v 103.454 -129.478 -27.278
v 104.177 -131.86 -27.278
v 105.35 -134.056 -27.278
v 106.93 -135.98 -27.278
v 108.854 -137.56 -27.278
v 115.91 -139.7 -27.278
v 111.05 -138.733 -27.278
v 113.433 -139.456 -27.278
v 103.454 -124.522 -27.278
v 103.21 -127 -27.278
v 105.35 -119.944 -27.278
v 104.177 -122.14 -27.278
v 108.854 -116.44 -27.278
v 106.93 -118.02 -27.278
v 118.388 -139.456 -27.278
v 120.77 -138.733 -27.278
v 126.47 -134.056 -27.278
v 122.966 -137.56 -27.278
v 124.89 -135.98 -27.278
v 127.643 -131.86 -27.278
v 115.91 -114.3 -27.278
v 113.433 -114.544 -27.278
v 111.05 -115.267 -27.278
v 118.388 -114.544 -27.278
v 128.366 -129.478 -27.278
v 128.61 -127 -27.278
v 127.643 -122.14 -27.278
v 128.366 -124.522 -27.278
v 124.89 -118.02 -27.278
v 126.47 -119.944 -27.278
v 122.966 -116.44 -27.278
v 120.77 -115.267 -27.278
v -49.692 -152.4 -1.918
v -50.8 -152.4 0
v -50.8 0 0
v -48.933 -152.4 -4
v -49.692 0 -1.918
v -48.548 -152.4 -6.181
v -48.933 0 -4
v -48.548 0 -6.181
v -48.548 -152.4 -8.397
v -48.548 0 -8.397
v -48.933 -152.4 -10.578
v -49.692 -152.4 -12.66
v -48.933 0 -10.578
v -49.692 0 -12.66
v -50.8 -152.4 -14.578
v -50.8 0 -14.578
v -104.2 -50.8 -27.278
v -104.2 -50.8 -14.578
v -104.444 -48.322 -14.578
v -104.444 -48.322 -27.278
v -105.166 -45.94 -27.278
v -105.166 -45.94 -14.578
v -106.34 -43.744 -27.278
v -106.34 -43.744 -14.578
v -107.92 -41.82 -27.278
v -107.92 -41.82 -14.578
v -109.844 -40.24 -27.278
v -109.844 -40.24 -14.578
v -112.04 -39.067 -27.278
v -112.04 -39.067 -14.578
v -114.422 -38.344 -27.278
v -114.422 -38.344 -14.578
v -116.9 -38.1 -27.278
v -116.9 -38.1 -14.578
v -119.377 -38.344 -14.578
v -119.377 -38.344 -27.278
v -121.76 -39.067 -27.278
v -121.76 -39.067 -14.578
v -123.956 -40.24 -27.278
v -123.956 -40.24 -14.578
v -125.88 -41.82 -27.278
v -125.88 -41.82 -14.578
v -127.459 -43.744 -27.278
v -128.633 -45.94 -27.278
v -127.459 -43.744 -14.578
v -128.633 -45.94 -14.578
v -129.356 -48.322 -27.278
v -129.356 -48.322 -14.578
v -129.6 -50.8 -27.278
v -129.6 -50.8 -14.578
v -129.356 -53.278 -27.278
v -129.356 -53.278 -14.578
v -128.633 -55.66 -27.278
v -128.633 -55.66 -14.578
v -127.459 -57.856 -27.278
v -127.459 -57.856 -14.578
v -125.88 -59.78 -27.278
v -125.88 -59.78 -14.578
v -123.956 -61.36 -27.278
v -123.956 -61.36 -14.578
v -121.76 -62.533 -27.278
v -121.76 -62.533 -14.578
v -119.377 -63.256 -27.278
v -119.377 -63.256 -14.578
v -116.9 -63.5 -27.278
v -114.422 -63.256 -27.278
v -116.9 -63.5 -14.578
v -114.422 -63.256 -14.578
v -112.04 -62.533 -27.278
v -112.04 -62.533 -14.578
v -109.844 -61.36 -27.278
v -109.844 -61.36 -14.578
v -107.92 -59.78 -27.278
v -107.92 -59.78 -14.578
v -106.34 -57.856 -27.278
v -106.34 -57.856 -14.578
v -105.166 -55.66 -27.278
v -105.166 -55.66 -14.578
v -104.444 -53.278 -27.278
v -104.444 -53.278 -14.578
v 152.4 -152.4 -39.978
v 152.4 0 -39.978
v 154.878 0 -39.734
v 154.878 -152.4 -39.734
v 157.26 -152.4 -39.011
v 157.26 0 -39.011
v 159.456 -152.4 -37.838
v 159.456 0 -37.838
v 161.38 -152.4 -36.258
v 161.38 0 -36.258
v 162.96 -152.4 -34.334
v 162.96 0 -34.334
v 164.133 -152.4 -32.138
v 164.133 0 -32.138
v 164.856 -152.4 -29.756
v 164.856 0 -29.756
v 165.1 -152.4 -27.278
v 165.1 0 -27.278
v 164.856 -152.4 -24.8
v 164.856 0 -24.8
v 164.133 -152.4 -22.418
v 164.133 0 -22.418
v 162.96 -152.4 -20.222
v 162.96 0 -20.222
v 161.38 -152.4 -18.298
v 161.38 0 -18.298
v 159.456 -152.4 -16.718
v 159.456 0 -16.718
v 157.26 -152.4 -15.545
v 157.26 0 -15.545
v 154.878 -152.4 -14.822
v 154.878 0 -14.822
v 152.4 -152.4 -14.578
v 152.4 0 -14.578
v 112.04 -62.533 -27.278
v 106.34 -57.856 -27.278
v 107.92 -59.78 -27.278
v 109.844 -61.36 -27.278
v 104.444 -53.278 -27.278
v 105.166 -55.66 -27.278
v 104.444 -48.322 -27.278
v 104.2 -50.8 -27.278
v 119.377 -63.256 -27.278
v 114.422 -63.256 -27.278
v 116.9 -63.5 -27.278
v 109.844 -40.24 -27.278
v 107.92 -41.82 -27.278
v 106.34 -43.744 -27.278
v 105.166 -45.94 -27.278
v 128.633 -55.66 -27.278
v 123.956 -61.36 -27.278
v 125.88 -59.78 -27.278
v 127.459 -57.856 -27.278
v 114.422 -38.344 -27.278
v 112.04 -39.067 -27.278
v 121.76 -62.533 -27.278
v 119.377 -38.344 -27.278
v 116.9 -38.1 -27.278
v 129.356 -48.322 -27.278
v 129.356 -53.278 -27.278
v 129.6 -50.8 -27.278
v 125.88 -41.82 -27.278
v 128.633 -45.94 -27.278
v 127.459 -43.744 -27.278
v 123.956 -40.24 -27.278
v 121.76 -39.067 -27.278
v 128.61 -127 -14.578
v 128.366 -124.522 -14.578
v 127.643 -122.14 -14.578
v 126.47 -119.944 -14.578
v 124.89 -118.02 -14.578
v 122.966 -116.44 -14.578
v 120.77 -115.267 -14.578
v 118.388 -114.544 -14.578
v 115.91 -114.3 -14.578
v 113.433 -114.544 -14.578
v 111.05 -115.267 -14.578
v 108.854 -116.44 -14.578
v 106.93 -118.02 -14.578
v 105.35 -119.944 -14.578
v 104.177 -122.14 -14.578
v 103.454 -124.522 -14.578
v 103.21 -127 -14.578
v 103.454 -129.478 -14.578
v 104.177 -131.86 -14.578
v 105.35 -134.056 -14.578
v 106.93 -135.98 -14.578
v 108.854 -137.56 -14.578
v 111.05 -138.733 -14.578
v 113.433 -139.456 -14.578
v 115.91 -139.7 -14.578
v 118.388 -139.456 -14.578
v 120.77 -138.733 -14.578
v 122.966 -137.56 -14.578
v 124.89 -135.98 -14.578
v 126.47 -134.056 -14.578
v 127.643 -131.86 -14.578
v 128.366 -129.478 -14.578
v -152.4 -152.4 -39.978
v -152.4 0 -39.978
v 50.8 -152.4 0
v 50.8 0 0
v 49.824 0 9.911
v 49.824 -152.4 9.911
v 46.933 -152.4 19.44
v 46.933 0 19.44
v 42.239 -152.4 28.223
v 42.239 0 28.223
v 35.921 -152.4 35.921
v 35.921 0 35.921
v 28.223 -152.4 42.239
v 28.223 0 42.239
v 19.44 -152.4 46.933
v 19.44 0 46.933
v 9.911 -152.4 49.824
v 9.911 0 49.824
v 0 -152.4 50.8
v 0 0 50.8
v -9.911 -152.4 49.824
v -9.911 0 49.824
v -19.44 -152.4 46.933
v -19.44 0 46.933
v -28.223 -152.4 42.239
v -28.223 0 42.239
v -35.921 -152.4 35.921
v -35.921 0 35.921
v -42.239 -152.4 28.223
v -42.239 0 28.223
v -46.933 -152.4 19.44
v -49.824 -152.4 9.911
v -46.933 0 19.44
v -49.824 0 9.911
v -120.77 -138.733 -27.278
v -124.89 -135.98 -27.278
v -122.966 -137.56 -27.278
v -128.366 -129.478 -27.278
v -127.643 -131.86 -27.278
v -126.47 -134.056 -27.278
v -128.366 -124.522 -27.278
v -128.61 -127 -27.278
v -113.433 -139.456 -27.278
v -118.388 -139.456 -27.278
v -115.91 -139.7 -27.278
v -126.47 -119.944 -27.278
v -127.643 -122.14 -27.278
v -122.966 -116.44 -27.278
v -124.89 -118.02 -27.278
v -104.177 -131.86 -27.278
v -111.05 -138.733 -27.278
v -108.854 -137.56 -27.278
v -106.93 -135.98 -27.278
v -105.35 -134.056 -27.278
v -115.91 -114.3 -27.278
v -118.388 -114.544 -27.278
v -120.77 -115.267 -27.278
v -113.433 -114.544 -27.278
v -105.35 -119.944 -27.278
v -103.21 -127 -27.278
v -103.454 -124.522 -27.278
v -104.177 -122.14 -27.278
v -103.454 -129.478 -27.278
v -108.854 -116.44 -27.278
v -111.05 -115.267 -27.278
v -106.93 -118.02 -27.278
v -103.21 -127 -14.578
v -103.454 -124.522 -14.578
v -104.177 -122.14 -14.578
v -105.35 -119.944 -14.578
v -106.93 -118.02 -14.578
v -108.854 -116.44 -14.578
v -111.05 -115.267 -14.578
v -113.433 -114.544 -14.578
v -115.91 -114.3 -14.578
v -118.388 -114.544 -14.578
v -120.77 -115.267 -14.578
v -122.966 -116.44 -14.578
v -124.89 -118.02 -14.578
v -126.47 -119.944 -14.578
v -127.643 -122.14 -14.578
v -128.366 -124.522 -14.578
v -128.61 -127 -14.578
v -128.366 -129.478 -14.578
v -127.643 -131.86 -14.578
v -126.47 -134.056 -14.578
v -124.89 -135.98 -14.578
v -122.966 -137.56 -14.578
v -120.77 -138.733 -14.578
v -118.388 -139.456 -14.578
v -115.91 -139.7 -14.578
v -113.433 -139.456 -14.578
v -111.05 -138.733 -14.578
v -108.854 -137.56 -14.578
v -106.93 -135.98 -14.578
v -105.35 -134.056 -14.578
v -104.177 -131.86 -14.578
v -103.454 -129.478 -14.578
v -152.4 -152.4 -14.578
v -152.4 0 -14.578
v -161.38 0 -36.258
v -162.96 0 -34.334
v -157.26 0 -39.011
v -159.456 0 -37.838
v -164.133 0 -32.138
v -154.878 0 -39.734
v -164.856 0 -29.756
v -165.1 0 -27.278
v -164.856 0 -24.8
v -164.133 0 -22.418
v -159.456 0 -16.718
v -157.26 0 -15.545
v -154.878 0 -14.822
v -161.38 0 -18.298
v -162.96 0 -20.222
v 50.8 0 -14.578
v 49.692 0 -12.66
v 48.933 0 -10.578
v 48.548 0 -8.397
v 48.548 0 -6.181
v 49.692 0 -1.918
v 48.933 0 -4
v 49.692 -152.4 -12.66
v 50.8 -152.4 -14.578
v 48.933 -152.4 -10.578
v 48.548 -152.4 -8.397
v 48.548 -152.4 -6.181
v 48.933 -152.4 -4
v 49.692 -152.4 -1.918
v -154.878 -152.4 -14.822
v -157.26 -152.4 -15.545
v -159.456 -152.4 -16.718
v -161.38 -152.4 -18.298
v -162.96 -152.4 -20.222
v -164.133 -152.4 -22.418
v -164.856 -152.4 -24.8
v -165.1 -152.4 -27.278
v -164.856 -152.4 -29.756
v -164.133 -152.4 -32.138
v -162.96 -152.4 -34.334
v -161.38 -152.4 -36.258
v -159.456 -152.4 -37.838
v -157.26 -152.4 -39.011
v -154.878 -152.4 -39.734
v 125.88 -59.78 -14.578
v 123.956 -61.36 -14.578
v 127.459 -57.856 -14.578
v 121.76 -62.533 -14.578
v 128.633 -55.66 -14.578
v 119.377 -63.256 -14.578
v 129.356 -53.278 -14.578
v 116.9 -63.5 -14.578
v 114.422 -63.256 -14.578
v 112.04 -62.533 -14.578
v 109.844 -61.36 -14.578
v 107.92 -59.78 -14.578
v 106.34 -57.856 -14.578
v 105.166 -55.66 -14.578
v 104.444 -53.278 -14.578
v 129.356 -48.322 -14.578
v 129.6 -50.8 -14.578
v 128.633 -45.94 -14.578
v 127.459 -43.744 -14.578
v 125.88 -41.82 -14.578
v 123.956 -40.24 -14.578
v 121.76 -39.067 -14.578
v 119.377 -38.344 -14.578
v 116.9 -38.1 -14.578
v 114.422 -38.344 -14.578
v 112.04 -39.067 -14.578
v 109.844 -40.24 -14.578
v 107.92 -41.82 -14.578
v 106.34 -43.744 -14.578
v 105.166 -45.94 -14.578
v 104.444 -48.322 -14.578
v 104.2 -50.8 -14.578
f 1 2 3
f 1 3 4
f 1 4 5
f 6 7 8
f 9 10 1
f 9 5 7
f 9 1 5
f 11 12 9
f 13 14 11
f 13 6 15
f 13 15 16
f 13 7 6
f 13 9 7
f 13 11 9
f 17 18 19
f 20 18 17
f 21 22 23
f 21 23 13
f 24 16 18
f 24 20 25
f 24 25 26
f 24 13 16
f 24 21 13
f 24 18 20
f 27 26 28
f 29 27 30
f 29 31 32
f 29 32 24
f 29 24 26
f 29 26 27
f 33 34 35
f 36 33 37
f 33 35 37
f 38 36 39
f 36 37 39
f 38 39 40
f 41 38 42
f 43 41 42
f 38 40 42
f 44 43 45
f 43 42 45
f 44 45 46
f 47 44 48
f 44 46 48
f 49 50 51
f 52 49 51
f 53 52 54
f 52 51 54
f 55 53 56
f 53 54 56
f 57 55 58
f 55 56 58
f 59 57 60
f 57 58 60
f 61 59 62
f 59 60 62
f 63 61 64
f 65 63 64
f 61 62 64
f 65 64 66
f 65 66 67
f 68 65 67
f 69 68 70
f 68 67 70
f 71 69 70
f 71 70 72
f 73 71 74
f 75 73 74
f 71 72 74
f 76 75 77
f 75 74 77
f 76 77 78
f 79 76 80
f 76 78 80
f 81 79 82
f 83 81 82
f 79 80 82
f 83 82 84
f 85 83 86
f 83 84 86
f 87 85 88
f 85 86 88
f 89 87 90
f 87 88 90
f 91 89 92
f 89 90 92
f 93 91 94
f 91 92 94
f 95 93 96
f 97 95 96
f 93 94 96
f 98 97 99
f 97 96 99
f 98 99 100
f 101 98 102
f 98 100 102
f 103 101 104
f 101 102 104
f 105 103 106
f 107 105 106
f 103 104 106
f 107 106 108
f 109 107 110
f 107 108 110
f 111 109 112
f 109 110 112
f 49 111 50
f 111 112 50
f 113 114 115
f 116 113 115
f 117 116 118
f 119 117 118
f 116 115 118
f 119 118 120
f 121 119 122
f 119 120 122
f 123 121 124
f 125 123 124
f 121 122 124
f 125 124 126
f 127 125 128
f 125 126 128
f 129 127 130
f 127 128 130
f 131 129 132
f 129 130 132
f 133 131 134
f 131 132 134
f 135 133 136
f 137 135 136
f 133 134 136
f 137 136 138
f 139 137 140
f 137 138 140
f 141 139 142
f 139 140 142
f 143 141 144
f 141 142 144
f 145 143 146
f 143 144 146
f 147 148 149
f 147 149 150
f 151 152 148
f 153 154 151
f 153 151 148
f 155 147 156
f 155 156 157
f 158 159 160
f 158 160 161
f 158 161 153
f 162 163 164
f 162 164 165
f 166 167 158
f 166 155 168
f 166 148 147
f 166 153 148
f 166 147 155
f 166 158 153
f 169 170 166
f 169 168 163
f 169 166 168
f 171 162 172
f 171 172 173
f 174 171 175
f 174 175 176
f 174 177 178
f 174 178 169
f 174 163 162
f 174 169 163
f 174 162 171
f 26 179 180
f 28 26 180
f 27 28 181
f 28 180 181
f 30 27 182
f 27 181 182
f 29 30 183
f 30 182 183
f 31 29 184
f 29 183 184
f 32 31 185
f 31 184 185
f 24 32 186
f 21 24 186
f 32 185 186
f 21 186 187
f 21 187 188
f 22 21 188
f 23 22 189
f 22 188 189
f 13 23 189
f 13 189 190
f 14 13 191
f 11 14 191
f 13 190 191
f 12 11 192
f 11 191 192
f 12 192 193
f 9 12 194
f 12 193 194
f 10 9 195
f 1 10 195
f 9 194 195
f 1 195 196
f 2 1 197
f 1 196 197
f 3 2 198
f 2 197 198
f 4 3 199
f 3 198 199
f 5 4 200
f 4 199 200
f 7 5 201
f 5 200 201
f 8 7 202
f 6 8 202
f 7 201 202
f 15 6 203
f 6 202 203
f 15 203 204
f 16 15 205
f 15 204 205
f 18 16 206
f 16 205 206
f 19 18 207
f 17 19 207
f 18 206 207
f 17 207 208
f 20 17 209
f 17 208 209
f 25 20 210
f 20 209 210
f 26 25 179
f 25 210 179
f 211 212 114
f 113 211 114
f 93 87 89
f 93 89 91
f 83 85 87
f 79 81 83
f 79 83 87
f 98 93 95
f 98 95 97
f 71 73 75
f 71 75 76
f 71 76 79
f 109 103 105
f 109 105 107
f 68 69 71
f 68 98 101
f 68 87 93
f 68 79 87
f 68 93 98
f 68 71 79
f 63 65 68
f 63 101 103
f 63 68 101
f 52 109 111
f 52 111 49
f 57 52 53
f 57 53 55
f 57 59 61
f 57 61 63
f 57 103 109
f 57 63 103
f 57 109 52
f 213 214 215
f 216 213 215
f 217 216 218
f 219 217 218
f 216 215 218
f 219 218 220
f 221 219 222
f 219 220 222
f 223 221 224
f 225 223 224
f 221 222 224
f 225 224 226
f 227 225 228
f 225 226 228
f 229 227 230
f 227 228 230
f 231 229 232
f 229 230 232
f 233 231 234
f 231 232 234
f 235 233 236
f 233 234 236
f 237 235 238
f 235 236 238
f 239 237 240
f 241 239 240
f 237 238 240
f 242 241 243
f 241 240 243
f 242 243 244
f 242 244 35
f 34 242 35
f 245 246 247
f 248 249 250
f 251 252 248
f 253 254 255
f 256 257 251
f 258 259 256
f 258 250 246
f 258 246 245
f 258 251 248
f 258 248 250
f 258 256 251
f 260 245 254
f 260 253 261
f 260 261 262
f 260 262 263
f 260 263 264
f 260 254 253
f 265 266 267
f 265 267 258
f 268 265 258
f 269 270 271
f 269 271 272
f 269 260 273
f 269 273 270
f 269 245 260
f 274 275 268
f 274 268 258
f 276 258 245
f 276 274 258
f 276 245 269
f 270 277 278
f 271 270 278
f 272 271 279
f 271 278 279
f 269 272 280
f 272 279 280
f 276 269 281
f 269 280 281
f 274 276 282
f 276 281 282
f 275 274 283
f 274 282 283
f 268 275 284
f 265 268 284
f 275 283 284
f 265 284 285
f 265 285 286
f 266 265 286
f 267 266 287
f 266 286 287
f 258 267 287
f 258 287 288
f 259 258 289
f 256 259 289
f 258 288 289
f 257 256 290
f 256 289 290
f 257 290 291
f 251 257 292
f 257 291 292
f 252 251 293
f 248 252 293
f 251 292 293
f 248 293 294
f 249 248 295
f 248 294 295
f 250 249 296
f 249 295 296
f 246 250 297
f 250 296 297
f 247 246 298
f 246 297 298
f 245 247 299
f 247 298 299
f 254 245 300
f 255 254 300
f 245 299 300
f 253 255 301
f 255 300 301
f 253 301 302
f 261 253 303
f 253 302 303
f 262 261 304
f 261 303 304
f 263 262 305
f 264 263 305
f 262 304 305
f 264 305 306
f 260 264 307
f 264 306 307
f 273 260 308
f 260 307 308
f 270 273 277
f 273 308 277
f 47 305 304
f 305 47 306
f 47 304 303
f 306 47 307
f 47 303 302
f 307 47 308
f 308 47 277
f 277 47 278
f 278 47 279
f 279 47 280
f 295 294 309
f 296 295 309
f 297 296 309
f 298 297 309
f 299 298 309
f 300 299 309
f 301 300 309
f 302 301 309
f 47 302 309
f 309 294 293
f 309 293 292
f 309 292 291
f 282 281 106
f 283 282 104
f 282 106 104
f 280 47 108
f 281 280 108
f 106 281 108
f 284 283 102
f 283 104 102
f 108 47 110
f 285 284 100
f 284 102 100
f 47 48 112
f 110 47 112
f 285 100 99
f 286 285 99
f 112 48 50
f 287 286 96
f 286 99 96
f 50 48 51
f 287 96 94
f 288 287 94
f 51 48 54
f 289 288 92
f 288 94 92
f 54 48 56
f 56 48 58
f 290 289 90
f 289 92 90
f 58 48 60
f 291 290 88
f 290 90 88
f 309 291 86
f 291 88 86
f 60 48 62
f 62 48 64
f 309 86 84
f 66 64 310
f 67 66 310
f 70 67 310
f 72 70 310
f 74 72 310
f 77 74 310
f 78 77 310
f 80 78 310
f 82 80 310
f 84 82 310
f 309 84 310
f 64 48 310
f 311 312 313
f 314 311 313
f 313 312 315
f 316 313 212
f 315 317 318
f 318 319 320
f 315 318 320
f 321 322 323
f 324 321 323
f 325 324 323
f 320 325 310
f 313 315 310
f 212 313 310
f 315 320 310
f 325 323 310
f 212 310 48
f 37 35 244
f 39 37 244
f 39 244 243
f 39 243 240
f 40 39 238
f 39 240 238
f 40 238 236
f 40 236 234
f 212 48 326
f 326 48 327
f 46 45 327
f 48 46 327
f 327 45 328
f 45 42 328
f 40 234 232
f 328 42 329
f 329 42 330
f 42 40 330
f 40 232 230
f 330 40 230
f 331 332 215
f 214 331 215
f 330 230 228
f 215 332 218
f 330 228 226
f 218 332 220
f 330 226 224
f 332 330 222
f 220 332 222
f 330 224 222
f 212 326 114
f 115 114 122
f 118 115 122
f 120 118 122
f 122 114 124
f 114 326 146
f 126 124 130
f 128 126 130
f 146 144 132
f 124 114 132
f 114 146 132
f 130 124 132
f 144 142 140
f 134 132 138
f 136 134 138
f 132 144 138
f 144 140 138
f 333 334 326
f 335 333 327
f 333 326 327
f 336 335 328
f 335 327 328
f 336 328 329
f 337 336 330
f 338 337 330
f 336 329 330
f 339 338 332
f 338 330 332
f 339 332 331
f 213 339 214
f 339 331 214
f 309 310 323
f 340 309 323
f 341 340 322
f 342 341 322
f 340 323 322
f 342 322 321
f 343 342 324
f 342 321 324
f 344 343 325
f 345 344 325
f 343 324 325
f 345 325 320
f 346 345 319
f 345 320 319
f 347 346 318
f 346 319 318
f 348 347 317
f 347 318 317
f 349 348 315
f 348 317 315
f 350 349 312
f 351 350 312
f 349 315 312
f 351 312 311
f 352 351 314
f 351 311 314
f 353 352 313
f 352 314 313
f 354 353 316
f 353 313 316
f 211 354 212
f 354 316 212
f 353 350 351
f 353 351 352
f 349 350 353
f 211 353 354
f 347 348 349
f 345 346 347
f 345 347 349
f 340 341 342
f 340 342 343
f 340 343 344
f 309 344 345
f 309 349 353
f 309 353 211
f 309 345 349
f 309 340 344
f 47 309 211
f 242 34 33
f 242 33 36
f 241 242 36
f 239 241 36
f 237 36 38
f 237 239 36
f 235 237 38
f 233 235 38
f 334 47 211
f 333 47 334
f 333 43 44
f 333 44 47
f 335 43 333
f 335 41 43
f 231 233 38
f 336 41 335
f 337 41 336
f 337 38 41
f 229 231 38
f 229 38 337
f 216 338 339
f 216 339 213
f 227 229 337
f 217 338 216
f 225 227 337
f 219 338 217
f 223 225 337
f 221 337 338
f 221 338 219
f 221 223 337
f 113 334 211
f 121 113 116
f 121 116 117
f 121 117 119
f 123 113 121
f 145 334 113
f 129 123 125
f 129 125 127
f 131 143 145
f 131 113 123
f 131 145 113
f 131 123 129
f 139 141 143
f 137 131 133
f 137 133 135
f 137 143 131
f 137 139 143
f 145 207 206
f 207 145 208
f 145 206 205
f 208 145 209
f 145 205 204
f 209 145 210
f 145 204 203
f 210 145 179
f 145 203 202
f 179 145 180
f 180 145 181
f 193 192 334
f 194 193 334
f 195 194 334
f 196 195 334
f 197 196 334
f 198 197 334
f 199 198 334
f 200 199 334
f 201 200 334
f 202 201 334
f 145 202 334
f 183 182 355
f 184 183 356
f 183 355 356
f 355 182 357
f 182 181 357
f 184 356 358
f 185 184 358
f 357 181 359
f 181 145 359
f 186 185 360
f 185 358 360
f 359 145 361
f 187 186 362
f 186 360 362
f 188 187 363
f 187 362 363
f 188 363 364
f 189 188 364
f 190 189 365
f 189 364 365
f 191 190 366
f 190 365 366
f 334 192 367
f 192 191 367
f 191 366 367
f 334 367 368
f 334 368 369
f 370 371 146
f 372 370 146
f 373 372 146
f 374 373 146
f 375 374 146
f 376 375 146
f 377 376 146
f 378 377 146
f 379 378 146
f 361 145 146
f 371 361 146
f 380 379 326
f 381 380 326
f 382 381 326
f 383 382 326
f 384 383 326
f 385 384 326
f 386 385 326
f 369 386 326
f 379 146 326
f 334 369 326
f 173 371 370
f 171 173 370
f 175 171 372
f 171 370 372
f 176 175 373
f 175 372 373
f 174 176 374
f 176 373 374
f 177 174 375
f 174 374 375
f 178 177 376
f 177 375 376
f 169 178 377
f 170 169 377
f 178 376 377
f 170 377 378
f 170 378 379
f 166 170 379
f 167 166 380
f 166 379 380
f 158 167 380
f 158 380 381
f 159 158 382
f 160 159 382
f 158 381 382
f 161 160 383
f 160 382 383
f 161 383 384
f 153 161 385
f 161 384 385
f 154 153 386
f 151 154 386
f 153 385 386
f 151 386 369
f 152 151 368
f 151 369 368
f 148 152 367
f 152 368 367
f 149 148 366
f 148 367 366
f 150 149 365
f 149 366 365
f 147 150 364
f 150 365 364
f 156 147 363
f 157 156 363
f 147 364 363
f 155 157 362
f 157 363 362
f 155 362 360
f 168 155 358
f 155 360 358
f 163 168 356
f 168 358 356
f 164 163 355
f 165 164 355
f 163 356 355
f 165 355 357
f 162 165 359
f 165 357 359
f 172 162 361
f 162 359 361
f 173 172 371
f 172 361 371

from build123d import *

# Parameters (mm, degrees)
F0_R       = 25.4
F1_DEPTH   = 152.4
F2_R       = 12.7
F1_FACE1_W = 304.8
F1_FACE1_H = 152.4
F3_DEPTH   = 12.7


with BuildPart() as f1:
    # F0 (on Front) → F1 (new body)
    with BuildSketch(Plane.XZ):
        with BuildLine():
            ThreePointArc((-152.4, -14.5780997561), (-165.1, -27.2780997561), (-152.4, -39.9780997561))
            Line((-152.4, -39.9780997561), (152.4, -39.9780997561))
            ThreePointArc((152.4, -39.9780997561), (165.1, -27.2780997561), (152.4, -14.5780997561))
            Line((152.4, -14.5780997561), (50.8, -14.5780997561))
            ThreePointArc((50.8, -14.5780997561), (48.4999880709, -7.2890498781), (50.8, 0))
            ThreePointArc((50.8, 0), (0, 50.8), (-50.8, 0))
            ThreePointArc((-50.8, 0), (-48.4999880709, -7.2890498781), (-50.8, -14.5780997561))
            Line((-50.8, -14.5780997561), (-152.4, -14.5780997561))
        make_face()
        Circle(F0_R, mode=Mode.SUBTRACT)
        Circle(F0_R)
    extrude(amount=F1_DEPTH)

    # F2 (on face) + F1_face1 (on face) → F3 (cut)
    with BuildSketch(Plane.XY.offset(-14.5780997561)):
        with Locations((115.9101505241, -127)):
            Circle(F2_R)
        with Locations((116.8997645463, -50.8)):
            Circle(F2_R)
        with Locations((-115.9101505241, -127)):
            Circle(F2_R)
        with Locations((-116.8997645463, -50.8)):
            Circle(F2_R)
    with BuildSketch(Plane(origin=(0, -76.2, -39.9780997561), x_dir=(1, 0, 0), z_dir=(0, 0, -1))):
        Rectangle(F1_FACE1_W, F1_FACE1_H)
    extrude(amount=-F3_DEPTH, dir=(0, 0, 1), mode=Mode.SUBTRACT)


solid = f1.part
